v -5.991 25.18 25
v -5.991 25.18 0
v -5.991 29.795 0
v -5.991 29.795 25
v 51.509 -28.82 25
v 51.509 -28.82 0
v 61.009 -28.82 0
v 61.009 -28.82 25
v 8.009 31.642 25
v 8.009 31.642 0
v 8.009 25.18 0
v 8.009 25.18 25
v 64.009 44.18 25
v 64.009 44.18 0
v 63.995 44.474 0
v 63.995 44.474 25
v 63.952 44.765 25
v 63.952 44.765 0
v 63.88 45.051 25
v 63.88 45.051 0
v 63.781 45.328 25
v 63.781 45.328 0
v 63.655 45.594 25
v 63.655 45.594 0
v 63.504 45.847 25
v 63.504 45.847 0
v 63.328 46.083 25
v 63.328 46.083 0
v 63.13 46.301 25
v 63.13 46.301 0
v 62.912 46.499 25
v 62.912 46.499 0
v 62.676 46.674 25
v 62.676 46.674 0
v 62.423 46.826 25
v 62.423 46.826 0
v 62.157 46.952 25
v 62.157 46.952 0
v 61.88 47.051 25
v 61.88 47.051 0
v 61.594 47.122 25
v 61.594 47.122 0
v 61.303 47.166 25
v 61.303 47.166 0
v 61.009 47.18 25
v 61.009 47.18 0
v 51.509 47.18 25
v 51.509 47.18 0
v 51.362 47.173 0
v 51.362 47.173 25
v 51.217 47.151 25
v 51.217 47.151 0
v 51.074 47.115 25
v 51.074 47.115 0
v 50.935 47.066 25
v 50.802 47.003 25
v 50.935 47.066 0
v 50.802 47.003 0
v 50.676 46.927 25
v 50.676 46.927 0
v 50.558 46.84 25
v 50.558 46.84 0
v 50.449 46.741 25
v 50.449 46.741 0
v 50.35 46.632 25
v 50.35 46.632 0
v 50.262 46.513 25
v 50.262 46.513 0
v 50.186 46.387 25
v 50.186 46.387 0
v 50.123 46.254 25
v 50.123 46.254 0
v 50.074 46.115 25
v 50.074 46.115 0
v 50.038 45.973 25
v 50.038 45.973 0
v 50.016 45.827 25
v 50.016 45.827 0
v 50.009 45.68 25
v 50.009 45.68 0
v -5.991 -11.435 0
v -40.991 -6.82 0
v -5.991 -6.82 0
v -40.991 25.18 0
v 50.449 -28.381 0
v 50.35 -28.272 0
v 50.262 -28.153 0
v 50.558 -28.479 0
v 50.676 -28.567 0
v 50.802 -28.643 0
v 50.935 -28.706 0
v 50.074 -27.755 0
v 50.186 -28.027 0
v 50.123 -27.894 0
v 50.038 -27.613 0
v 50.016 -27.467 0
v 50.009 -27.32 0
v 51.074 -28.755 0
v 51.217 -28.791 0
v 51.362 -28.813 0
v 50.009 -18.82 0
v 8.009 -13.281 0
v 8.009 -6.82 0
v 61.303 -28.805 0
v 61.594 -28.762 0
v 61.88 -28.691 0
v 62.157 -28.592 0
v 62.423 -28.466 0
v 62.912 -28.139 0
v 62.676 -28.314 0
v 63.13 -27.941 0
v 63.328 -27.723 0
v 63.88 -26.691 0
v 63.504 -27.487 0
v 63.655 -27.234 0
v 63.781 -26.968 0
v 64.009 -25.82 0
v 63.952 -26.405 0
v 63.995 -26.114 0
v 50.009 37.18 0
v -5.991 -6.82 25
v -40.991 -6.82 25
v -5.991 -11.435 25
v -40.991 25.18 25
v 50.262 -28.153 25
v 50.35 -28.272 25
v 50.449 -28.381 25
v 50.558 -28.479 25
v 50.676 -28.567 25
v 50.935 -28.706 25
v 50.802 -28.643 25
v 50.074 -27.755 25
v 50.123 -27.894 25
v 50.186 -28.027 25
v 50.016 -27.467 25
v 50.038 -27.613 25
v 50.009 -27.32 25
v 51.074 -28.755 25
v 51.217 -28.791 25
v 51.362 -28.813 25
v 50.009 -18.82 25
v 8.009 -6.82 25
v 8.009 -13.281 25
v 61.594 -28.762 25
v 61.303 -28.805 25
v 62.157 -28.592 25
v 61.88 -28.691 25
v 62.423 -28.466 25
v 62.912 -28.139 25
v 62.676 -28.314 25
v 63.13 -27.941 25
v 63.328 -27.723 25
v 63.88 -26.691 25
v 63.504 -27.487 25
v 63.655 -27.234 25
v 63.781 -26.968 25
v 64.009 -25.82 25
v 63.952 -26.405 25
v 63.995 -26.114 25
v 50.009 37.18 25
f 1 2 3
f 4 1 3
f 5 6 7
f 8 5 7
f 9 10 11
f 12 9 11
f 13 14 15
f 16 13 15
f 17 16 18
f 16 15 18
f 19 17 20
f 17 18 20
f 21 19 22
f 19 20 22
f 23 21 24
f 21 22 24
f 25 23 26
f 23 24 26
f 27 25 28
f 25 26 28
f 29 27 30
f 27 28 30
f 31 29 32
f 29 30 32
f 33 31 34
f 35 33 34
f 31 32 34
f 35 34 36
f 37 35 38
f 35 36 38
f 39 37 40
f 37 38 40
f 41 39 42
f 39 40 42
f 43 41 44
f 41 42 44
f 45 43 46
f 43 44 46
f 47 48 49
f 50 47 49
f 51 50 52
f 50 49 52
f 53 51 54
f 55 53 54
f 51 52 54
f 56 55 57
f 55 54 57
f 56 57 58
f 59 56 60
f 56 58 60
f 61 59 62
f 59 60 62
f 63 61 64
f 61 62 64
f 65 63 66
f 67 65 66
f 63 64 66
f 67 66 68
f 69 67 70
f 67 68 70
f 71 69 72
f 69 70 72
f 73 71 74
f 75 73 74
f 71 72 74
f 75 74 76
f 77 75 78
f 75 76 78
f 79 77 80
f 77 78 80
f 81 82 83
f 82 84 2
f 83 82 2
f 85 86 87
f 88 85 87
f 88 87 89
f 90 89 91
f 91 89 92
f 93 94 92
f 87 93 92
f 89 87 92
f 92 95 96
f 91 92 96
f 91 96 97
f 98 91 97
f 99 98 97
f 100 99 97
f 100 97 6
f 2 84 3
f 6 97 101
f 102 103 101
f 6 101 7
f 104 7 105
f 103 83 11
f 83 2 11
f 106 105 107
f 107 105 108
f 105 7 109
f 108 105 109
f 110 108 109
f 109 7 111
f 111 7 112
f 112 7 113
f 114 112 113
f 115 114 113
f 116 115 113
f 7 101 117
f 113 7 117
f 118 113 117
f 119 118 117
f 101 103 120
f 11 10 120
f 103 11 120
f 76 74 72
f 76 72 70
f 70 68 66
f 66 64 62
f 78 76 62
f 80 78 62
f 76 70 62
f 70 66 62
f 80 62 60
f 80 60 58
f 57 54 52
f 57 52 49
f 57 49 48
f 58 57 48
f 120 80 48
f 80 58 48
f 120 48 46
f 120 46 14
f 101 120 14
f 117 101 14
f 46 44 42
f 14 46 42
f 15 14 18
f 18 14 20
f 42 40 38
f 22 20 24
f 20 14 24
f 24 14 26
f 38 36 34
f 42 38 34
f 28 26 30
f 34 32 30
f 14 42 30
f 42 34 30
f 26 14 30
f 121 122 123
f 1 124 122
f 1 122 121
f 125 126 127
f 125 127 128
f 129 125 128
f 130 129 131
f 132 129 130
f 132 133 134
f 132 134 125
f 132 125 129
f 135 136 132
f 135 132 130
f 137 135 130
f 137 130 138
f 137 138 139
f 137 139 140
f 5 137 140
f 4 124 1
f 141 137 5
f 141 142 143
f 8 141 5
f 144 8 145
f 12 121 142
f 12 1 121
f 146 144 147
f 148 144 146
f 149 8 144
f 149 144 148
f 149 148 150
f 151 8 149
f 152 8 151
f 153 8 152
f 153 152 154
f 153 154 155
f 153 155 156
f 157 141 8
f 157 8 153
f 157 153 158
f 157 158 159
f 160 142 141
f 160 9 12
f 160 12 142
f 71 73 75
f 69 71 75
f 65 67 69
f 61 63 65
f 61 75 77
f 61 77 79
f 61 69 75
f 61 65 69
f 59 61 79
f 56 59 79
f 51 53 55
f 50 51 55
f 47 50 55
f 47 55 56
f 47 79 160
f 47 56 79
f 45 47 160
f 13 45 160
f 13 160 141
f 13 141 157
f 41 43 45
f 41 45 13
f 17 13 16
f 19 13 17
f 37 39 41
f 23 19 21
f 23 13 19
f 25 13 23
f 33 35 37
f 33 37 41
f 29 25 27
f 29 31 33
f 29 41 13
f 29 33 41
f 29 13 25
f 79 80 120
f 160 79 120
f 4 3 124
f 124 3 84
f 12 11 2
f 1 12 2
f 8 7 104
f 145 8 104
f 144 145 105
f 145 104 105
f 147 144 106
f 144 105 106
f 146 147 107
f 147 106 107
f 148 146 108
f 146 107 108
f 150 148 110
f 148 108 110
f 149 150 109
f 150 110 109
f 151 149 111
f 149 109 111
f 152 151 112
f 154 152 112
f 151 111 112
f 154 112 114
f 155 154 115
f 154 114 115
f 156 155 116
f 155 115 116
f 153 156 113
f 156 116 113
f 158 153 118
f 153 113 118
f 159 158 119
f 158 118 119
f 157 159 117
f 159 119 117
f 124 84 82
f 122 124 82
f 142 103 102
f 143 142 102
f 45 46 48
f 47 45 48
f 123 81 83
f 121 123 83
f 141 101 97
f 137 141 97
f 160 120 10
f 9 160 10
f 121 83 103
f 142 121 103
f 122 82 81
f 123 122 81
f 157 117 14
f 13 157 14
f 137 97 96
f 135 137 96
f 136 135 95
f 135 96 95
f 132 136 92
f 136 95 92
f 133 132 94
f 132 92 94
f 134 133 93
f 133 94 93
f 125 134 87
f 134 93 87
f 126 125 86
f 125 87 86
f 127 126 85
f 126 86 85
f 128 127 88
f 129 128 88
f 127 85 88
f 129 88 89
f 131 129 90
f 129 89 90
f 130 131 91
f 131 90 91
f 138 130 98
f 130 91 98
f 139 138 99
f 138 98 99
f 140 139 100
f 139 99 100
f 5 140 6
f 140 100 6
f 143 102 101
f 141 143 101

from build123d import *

# Parameters (mm, degrees)
F1_DEPTH = 25


with BuildPart() as f1:
    # F0 (on Top) → F1 (new body)
    with BuildSketch(Plane.XY):
        with BuildLine():
            Line((64.009178, -25.81994), (64.009178, 44.18006))
            ThreePointArc((64.009178, 44.18006), (63.130498, 46.301381), (61.009178, 47.18006))
            Line((61.009178, 47.18006), (51.509178, 47.18006))
            ThreePointArc((51.509178, 47.18006), (50.448518, 46.74072), (50.009178, 45.68006))
            Line((50.009178, 45.68006), (50.009178, 37.18006))
            Line((50.009178, 37.18006), (8.009178, 31.641599))
            Line((8.009178, 31.641599), (8.009178, 25.18006))
            Line((8.009178, 25.18006), (-5.990822, 25.18006))
            Line((-5.990822, 25.18006), (-5.990822, 29.795445))
            Line((-5.990822, 29.795445), (-40.990822, 25.18006))
            Line((-40.990822, 25.18006), (-40.990822, 9.18006))
            Line((-40.990822, 9.18006), (-40.990822, -6.81994))
            Line((-40.990822, -6.81994), (-5.990822, -11.435324))
            Line((-5.990822, -11.435324), (-5.990822, -6.81994))
            Line((-5.990822, -6.81994), (8.009178, -6.81994))
            Line((8.009178, -6.81994), (8.009178, -13.281478))
            Line((8.009178, -13.281478), (50.009178, -18.81994))
            Line((50.009178, -18.81994), (50.009178, -27.31994))
            ThreePointArc((50.009178, -27.31994), (50.448518, -28.3806), (51.509178, -28.81994))
            Line((51.509178, -28.81994), (61.009178, -28.81994))
            ThreePointArc((61.009178, -28.81994), (63.130498, -27.94126), (64.009178, -25.81994))
        make_face()
    extrude(amount=F1_DEPTH)


solid = f1.part
